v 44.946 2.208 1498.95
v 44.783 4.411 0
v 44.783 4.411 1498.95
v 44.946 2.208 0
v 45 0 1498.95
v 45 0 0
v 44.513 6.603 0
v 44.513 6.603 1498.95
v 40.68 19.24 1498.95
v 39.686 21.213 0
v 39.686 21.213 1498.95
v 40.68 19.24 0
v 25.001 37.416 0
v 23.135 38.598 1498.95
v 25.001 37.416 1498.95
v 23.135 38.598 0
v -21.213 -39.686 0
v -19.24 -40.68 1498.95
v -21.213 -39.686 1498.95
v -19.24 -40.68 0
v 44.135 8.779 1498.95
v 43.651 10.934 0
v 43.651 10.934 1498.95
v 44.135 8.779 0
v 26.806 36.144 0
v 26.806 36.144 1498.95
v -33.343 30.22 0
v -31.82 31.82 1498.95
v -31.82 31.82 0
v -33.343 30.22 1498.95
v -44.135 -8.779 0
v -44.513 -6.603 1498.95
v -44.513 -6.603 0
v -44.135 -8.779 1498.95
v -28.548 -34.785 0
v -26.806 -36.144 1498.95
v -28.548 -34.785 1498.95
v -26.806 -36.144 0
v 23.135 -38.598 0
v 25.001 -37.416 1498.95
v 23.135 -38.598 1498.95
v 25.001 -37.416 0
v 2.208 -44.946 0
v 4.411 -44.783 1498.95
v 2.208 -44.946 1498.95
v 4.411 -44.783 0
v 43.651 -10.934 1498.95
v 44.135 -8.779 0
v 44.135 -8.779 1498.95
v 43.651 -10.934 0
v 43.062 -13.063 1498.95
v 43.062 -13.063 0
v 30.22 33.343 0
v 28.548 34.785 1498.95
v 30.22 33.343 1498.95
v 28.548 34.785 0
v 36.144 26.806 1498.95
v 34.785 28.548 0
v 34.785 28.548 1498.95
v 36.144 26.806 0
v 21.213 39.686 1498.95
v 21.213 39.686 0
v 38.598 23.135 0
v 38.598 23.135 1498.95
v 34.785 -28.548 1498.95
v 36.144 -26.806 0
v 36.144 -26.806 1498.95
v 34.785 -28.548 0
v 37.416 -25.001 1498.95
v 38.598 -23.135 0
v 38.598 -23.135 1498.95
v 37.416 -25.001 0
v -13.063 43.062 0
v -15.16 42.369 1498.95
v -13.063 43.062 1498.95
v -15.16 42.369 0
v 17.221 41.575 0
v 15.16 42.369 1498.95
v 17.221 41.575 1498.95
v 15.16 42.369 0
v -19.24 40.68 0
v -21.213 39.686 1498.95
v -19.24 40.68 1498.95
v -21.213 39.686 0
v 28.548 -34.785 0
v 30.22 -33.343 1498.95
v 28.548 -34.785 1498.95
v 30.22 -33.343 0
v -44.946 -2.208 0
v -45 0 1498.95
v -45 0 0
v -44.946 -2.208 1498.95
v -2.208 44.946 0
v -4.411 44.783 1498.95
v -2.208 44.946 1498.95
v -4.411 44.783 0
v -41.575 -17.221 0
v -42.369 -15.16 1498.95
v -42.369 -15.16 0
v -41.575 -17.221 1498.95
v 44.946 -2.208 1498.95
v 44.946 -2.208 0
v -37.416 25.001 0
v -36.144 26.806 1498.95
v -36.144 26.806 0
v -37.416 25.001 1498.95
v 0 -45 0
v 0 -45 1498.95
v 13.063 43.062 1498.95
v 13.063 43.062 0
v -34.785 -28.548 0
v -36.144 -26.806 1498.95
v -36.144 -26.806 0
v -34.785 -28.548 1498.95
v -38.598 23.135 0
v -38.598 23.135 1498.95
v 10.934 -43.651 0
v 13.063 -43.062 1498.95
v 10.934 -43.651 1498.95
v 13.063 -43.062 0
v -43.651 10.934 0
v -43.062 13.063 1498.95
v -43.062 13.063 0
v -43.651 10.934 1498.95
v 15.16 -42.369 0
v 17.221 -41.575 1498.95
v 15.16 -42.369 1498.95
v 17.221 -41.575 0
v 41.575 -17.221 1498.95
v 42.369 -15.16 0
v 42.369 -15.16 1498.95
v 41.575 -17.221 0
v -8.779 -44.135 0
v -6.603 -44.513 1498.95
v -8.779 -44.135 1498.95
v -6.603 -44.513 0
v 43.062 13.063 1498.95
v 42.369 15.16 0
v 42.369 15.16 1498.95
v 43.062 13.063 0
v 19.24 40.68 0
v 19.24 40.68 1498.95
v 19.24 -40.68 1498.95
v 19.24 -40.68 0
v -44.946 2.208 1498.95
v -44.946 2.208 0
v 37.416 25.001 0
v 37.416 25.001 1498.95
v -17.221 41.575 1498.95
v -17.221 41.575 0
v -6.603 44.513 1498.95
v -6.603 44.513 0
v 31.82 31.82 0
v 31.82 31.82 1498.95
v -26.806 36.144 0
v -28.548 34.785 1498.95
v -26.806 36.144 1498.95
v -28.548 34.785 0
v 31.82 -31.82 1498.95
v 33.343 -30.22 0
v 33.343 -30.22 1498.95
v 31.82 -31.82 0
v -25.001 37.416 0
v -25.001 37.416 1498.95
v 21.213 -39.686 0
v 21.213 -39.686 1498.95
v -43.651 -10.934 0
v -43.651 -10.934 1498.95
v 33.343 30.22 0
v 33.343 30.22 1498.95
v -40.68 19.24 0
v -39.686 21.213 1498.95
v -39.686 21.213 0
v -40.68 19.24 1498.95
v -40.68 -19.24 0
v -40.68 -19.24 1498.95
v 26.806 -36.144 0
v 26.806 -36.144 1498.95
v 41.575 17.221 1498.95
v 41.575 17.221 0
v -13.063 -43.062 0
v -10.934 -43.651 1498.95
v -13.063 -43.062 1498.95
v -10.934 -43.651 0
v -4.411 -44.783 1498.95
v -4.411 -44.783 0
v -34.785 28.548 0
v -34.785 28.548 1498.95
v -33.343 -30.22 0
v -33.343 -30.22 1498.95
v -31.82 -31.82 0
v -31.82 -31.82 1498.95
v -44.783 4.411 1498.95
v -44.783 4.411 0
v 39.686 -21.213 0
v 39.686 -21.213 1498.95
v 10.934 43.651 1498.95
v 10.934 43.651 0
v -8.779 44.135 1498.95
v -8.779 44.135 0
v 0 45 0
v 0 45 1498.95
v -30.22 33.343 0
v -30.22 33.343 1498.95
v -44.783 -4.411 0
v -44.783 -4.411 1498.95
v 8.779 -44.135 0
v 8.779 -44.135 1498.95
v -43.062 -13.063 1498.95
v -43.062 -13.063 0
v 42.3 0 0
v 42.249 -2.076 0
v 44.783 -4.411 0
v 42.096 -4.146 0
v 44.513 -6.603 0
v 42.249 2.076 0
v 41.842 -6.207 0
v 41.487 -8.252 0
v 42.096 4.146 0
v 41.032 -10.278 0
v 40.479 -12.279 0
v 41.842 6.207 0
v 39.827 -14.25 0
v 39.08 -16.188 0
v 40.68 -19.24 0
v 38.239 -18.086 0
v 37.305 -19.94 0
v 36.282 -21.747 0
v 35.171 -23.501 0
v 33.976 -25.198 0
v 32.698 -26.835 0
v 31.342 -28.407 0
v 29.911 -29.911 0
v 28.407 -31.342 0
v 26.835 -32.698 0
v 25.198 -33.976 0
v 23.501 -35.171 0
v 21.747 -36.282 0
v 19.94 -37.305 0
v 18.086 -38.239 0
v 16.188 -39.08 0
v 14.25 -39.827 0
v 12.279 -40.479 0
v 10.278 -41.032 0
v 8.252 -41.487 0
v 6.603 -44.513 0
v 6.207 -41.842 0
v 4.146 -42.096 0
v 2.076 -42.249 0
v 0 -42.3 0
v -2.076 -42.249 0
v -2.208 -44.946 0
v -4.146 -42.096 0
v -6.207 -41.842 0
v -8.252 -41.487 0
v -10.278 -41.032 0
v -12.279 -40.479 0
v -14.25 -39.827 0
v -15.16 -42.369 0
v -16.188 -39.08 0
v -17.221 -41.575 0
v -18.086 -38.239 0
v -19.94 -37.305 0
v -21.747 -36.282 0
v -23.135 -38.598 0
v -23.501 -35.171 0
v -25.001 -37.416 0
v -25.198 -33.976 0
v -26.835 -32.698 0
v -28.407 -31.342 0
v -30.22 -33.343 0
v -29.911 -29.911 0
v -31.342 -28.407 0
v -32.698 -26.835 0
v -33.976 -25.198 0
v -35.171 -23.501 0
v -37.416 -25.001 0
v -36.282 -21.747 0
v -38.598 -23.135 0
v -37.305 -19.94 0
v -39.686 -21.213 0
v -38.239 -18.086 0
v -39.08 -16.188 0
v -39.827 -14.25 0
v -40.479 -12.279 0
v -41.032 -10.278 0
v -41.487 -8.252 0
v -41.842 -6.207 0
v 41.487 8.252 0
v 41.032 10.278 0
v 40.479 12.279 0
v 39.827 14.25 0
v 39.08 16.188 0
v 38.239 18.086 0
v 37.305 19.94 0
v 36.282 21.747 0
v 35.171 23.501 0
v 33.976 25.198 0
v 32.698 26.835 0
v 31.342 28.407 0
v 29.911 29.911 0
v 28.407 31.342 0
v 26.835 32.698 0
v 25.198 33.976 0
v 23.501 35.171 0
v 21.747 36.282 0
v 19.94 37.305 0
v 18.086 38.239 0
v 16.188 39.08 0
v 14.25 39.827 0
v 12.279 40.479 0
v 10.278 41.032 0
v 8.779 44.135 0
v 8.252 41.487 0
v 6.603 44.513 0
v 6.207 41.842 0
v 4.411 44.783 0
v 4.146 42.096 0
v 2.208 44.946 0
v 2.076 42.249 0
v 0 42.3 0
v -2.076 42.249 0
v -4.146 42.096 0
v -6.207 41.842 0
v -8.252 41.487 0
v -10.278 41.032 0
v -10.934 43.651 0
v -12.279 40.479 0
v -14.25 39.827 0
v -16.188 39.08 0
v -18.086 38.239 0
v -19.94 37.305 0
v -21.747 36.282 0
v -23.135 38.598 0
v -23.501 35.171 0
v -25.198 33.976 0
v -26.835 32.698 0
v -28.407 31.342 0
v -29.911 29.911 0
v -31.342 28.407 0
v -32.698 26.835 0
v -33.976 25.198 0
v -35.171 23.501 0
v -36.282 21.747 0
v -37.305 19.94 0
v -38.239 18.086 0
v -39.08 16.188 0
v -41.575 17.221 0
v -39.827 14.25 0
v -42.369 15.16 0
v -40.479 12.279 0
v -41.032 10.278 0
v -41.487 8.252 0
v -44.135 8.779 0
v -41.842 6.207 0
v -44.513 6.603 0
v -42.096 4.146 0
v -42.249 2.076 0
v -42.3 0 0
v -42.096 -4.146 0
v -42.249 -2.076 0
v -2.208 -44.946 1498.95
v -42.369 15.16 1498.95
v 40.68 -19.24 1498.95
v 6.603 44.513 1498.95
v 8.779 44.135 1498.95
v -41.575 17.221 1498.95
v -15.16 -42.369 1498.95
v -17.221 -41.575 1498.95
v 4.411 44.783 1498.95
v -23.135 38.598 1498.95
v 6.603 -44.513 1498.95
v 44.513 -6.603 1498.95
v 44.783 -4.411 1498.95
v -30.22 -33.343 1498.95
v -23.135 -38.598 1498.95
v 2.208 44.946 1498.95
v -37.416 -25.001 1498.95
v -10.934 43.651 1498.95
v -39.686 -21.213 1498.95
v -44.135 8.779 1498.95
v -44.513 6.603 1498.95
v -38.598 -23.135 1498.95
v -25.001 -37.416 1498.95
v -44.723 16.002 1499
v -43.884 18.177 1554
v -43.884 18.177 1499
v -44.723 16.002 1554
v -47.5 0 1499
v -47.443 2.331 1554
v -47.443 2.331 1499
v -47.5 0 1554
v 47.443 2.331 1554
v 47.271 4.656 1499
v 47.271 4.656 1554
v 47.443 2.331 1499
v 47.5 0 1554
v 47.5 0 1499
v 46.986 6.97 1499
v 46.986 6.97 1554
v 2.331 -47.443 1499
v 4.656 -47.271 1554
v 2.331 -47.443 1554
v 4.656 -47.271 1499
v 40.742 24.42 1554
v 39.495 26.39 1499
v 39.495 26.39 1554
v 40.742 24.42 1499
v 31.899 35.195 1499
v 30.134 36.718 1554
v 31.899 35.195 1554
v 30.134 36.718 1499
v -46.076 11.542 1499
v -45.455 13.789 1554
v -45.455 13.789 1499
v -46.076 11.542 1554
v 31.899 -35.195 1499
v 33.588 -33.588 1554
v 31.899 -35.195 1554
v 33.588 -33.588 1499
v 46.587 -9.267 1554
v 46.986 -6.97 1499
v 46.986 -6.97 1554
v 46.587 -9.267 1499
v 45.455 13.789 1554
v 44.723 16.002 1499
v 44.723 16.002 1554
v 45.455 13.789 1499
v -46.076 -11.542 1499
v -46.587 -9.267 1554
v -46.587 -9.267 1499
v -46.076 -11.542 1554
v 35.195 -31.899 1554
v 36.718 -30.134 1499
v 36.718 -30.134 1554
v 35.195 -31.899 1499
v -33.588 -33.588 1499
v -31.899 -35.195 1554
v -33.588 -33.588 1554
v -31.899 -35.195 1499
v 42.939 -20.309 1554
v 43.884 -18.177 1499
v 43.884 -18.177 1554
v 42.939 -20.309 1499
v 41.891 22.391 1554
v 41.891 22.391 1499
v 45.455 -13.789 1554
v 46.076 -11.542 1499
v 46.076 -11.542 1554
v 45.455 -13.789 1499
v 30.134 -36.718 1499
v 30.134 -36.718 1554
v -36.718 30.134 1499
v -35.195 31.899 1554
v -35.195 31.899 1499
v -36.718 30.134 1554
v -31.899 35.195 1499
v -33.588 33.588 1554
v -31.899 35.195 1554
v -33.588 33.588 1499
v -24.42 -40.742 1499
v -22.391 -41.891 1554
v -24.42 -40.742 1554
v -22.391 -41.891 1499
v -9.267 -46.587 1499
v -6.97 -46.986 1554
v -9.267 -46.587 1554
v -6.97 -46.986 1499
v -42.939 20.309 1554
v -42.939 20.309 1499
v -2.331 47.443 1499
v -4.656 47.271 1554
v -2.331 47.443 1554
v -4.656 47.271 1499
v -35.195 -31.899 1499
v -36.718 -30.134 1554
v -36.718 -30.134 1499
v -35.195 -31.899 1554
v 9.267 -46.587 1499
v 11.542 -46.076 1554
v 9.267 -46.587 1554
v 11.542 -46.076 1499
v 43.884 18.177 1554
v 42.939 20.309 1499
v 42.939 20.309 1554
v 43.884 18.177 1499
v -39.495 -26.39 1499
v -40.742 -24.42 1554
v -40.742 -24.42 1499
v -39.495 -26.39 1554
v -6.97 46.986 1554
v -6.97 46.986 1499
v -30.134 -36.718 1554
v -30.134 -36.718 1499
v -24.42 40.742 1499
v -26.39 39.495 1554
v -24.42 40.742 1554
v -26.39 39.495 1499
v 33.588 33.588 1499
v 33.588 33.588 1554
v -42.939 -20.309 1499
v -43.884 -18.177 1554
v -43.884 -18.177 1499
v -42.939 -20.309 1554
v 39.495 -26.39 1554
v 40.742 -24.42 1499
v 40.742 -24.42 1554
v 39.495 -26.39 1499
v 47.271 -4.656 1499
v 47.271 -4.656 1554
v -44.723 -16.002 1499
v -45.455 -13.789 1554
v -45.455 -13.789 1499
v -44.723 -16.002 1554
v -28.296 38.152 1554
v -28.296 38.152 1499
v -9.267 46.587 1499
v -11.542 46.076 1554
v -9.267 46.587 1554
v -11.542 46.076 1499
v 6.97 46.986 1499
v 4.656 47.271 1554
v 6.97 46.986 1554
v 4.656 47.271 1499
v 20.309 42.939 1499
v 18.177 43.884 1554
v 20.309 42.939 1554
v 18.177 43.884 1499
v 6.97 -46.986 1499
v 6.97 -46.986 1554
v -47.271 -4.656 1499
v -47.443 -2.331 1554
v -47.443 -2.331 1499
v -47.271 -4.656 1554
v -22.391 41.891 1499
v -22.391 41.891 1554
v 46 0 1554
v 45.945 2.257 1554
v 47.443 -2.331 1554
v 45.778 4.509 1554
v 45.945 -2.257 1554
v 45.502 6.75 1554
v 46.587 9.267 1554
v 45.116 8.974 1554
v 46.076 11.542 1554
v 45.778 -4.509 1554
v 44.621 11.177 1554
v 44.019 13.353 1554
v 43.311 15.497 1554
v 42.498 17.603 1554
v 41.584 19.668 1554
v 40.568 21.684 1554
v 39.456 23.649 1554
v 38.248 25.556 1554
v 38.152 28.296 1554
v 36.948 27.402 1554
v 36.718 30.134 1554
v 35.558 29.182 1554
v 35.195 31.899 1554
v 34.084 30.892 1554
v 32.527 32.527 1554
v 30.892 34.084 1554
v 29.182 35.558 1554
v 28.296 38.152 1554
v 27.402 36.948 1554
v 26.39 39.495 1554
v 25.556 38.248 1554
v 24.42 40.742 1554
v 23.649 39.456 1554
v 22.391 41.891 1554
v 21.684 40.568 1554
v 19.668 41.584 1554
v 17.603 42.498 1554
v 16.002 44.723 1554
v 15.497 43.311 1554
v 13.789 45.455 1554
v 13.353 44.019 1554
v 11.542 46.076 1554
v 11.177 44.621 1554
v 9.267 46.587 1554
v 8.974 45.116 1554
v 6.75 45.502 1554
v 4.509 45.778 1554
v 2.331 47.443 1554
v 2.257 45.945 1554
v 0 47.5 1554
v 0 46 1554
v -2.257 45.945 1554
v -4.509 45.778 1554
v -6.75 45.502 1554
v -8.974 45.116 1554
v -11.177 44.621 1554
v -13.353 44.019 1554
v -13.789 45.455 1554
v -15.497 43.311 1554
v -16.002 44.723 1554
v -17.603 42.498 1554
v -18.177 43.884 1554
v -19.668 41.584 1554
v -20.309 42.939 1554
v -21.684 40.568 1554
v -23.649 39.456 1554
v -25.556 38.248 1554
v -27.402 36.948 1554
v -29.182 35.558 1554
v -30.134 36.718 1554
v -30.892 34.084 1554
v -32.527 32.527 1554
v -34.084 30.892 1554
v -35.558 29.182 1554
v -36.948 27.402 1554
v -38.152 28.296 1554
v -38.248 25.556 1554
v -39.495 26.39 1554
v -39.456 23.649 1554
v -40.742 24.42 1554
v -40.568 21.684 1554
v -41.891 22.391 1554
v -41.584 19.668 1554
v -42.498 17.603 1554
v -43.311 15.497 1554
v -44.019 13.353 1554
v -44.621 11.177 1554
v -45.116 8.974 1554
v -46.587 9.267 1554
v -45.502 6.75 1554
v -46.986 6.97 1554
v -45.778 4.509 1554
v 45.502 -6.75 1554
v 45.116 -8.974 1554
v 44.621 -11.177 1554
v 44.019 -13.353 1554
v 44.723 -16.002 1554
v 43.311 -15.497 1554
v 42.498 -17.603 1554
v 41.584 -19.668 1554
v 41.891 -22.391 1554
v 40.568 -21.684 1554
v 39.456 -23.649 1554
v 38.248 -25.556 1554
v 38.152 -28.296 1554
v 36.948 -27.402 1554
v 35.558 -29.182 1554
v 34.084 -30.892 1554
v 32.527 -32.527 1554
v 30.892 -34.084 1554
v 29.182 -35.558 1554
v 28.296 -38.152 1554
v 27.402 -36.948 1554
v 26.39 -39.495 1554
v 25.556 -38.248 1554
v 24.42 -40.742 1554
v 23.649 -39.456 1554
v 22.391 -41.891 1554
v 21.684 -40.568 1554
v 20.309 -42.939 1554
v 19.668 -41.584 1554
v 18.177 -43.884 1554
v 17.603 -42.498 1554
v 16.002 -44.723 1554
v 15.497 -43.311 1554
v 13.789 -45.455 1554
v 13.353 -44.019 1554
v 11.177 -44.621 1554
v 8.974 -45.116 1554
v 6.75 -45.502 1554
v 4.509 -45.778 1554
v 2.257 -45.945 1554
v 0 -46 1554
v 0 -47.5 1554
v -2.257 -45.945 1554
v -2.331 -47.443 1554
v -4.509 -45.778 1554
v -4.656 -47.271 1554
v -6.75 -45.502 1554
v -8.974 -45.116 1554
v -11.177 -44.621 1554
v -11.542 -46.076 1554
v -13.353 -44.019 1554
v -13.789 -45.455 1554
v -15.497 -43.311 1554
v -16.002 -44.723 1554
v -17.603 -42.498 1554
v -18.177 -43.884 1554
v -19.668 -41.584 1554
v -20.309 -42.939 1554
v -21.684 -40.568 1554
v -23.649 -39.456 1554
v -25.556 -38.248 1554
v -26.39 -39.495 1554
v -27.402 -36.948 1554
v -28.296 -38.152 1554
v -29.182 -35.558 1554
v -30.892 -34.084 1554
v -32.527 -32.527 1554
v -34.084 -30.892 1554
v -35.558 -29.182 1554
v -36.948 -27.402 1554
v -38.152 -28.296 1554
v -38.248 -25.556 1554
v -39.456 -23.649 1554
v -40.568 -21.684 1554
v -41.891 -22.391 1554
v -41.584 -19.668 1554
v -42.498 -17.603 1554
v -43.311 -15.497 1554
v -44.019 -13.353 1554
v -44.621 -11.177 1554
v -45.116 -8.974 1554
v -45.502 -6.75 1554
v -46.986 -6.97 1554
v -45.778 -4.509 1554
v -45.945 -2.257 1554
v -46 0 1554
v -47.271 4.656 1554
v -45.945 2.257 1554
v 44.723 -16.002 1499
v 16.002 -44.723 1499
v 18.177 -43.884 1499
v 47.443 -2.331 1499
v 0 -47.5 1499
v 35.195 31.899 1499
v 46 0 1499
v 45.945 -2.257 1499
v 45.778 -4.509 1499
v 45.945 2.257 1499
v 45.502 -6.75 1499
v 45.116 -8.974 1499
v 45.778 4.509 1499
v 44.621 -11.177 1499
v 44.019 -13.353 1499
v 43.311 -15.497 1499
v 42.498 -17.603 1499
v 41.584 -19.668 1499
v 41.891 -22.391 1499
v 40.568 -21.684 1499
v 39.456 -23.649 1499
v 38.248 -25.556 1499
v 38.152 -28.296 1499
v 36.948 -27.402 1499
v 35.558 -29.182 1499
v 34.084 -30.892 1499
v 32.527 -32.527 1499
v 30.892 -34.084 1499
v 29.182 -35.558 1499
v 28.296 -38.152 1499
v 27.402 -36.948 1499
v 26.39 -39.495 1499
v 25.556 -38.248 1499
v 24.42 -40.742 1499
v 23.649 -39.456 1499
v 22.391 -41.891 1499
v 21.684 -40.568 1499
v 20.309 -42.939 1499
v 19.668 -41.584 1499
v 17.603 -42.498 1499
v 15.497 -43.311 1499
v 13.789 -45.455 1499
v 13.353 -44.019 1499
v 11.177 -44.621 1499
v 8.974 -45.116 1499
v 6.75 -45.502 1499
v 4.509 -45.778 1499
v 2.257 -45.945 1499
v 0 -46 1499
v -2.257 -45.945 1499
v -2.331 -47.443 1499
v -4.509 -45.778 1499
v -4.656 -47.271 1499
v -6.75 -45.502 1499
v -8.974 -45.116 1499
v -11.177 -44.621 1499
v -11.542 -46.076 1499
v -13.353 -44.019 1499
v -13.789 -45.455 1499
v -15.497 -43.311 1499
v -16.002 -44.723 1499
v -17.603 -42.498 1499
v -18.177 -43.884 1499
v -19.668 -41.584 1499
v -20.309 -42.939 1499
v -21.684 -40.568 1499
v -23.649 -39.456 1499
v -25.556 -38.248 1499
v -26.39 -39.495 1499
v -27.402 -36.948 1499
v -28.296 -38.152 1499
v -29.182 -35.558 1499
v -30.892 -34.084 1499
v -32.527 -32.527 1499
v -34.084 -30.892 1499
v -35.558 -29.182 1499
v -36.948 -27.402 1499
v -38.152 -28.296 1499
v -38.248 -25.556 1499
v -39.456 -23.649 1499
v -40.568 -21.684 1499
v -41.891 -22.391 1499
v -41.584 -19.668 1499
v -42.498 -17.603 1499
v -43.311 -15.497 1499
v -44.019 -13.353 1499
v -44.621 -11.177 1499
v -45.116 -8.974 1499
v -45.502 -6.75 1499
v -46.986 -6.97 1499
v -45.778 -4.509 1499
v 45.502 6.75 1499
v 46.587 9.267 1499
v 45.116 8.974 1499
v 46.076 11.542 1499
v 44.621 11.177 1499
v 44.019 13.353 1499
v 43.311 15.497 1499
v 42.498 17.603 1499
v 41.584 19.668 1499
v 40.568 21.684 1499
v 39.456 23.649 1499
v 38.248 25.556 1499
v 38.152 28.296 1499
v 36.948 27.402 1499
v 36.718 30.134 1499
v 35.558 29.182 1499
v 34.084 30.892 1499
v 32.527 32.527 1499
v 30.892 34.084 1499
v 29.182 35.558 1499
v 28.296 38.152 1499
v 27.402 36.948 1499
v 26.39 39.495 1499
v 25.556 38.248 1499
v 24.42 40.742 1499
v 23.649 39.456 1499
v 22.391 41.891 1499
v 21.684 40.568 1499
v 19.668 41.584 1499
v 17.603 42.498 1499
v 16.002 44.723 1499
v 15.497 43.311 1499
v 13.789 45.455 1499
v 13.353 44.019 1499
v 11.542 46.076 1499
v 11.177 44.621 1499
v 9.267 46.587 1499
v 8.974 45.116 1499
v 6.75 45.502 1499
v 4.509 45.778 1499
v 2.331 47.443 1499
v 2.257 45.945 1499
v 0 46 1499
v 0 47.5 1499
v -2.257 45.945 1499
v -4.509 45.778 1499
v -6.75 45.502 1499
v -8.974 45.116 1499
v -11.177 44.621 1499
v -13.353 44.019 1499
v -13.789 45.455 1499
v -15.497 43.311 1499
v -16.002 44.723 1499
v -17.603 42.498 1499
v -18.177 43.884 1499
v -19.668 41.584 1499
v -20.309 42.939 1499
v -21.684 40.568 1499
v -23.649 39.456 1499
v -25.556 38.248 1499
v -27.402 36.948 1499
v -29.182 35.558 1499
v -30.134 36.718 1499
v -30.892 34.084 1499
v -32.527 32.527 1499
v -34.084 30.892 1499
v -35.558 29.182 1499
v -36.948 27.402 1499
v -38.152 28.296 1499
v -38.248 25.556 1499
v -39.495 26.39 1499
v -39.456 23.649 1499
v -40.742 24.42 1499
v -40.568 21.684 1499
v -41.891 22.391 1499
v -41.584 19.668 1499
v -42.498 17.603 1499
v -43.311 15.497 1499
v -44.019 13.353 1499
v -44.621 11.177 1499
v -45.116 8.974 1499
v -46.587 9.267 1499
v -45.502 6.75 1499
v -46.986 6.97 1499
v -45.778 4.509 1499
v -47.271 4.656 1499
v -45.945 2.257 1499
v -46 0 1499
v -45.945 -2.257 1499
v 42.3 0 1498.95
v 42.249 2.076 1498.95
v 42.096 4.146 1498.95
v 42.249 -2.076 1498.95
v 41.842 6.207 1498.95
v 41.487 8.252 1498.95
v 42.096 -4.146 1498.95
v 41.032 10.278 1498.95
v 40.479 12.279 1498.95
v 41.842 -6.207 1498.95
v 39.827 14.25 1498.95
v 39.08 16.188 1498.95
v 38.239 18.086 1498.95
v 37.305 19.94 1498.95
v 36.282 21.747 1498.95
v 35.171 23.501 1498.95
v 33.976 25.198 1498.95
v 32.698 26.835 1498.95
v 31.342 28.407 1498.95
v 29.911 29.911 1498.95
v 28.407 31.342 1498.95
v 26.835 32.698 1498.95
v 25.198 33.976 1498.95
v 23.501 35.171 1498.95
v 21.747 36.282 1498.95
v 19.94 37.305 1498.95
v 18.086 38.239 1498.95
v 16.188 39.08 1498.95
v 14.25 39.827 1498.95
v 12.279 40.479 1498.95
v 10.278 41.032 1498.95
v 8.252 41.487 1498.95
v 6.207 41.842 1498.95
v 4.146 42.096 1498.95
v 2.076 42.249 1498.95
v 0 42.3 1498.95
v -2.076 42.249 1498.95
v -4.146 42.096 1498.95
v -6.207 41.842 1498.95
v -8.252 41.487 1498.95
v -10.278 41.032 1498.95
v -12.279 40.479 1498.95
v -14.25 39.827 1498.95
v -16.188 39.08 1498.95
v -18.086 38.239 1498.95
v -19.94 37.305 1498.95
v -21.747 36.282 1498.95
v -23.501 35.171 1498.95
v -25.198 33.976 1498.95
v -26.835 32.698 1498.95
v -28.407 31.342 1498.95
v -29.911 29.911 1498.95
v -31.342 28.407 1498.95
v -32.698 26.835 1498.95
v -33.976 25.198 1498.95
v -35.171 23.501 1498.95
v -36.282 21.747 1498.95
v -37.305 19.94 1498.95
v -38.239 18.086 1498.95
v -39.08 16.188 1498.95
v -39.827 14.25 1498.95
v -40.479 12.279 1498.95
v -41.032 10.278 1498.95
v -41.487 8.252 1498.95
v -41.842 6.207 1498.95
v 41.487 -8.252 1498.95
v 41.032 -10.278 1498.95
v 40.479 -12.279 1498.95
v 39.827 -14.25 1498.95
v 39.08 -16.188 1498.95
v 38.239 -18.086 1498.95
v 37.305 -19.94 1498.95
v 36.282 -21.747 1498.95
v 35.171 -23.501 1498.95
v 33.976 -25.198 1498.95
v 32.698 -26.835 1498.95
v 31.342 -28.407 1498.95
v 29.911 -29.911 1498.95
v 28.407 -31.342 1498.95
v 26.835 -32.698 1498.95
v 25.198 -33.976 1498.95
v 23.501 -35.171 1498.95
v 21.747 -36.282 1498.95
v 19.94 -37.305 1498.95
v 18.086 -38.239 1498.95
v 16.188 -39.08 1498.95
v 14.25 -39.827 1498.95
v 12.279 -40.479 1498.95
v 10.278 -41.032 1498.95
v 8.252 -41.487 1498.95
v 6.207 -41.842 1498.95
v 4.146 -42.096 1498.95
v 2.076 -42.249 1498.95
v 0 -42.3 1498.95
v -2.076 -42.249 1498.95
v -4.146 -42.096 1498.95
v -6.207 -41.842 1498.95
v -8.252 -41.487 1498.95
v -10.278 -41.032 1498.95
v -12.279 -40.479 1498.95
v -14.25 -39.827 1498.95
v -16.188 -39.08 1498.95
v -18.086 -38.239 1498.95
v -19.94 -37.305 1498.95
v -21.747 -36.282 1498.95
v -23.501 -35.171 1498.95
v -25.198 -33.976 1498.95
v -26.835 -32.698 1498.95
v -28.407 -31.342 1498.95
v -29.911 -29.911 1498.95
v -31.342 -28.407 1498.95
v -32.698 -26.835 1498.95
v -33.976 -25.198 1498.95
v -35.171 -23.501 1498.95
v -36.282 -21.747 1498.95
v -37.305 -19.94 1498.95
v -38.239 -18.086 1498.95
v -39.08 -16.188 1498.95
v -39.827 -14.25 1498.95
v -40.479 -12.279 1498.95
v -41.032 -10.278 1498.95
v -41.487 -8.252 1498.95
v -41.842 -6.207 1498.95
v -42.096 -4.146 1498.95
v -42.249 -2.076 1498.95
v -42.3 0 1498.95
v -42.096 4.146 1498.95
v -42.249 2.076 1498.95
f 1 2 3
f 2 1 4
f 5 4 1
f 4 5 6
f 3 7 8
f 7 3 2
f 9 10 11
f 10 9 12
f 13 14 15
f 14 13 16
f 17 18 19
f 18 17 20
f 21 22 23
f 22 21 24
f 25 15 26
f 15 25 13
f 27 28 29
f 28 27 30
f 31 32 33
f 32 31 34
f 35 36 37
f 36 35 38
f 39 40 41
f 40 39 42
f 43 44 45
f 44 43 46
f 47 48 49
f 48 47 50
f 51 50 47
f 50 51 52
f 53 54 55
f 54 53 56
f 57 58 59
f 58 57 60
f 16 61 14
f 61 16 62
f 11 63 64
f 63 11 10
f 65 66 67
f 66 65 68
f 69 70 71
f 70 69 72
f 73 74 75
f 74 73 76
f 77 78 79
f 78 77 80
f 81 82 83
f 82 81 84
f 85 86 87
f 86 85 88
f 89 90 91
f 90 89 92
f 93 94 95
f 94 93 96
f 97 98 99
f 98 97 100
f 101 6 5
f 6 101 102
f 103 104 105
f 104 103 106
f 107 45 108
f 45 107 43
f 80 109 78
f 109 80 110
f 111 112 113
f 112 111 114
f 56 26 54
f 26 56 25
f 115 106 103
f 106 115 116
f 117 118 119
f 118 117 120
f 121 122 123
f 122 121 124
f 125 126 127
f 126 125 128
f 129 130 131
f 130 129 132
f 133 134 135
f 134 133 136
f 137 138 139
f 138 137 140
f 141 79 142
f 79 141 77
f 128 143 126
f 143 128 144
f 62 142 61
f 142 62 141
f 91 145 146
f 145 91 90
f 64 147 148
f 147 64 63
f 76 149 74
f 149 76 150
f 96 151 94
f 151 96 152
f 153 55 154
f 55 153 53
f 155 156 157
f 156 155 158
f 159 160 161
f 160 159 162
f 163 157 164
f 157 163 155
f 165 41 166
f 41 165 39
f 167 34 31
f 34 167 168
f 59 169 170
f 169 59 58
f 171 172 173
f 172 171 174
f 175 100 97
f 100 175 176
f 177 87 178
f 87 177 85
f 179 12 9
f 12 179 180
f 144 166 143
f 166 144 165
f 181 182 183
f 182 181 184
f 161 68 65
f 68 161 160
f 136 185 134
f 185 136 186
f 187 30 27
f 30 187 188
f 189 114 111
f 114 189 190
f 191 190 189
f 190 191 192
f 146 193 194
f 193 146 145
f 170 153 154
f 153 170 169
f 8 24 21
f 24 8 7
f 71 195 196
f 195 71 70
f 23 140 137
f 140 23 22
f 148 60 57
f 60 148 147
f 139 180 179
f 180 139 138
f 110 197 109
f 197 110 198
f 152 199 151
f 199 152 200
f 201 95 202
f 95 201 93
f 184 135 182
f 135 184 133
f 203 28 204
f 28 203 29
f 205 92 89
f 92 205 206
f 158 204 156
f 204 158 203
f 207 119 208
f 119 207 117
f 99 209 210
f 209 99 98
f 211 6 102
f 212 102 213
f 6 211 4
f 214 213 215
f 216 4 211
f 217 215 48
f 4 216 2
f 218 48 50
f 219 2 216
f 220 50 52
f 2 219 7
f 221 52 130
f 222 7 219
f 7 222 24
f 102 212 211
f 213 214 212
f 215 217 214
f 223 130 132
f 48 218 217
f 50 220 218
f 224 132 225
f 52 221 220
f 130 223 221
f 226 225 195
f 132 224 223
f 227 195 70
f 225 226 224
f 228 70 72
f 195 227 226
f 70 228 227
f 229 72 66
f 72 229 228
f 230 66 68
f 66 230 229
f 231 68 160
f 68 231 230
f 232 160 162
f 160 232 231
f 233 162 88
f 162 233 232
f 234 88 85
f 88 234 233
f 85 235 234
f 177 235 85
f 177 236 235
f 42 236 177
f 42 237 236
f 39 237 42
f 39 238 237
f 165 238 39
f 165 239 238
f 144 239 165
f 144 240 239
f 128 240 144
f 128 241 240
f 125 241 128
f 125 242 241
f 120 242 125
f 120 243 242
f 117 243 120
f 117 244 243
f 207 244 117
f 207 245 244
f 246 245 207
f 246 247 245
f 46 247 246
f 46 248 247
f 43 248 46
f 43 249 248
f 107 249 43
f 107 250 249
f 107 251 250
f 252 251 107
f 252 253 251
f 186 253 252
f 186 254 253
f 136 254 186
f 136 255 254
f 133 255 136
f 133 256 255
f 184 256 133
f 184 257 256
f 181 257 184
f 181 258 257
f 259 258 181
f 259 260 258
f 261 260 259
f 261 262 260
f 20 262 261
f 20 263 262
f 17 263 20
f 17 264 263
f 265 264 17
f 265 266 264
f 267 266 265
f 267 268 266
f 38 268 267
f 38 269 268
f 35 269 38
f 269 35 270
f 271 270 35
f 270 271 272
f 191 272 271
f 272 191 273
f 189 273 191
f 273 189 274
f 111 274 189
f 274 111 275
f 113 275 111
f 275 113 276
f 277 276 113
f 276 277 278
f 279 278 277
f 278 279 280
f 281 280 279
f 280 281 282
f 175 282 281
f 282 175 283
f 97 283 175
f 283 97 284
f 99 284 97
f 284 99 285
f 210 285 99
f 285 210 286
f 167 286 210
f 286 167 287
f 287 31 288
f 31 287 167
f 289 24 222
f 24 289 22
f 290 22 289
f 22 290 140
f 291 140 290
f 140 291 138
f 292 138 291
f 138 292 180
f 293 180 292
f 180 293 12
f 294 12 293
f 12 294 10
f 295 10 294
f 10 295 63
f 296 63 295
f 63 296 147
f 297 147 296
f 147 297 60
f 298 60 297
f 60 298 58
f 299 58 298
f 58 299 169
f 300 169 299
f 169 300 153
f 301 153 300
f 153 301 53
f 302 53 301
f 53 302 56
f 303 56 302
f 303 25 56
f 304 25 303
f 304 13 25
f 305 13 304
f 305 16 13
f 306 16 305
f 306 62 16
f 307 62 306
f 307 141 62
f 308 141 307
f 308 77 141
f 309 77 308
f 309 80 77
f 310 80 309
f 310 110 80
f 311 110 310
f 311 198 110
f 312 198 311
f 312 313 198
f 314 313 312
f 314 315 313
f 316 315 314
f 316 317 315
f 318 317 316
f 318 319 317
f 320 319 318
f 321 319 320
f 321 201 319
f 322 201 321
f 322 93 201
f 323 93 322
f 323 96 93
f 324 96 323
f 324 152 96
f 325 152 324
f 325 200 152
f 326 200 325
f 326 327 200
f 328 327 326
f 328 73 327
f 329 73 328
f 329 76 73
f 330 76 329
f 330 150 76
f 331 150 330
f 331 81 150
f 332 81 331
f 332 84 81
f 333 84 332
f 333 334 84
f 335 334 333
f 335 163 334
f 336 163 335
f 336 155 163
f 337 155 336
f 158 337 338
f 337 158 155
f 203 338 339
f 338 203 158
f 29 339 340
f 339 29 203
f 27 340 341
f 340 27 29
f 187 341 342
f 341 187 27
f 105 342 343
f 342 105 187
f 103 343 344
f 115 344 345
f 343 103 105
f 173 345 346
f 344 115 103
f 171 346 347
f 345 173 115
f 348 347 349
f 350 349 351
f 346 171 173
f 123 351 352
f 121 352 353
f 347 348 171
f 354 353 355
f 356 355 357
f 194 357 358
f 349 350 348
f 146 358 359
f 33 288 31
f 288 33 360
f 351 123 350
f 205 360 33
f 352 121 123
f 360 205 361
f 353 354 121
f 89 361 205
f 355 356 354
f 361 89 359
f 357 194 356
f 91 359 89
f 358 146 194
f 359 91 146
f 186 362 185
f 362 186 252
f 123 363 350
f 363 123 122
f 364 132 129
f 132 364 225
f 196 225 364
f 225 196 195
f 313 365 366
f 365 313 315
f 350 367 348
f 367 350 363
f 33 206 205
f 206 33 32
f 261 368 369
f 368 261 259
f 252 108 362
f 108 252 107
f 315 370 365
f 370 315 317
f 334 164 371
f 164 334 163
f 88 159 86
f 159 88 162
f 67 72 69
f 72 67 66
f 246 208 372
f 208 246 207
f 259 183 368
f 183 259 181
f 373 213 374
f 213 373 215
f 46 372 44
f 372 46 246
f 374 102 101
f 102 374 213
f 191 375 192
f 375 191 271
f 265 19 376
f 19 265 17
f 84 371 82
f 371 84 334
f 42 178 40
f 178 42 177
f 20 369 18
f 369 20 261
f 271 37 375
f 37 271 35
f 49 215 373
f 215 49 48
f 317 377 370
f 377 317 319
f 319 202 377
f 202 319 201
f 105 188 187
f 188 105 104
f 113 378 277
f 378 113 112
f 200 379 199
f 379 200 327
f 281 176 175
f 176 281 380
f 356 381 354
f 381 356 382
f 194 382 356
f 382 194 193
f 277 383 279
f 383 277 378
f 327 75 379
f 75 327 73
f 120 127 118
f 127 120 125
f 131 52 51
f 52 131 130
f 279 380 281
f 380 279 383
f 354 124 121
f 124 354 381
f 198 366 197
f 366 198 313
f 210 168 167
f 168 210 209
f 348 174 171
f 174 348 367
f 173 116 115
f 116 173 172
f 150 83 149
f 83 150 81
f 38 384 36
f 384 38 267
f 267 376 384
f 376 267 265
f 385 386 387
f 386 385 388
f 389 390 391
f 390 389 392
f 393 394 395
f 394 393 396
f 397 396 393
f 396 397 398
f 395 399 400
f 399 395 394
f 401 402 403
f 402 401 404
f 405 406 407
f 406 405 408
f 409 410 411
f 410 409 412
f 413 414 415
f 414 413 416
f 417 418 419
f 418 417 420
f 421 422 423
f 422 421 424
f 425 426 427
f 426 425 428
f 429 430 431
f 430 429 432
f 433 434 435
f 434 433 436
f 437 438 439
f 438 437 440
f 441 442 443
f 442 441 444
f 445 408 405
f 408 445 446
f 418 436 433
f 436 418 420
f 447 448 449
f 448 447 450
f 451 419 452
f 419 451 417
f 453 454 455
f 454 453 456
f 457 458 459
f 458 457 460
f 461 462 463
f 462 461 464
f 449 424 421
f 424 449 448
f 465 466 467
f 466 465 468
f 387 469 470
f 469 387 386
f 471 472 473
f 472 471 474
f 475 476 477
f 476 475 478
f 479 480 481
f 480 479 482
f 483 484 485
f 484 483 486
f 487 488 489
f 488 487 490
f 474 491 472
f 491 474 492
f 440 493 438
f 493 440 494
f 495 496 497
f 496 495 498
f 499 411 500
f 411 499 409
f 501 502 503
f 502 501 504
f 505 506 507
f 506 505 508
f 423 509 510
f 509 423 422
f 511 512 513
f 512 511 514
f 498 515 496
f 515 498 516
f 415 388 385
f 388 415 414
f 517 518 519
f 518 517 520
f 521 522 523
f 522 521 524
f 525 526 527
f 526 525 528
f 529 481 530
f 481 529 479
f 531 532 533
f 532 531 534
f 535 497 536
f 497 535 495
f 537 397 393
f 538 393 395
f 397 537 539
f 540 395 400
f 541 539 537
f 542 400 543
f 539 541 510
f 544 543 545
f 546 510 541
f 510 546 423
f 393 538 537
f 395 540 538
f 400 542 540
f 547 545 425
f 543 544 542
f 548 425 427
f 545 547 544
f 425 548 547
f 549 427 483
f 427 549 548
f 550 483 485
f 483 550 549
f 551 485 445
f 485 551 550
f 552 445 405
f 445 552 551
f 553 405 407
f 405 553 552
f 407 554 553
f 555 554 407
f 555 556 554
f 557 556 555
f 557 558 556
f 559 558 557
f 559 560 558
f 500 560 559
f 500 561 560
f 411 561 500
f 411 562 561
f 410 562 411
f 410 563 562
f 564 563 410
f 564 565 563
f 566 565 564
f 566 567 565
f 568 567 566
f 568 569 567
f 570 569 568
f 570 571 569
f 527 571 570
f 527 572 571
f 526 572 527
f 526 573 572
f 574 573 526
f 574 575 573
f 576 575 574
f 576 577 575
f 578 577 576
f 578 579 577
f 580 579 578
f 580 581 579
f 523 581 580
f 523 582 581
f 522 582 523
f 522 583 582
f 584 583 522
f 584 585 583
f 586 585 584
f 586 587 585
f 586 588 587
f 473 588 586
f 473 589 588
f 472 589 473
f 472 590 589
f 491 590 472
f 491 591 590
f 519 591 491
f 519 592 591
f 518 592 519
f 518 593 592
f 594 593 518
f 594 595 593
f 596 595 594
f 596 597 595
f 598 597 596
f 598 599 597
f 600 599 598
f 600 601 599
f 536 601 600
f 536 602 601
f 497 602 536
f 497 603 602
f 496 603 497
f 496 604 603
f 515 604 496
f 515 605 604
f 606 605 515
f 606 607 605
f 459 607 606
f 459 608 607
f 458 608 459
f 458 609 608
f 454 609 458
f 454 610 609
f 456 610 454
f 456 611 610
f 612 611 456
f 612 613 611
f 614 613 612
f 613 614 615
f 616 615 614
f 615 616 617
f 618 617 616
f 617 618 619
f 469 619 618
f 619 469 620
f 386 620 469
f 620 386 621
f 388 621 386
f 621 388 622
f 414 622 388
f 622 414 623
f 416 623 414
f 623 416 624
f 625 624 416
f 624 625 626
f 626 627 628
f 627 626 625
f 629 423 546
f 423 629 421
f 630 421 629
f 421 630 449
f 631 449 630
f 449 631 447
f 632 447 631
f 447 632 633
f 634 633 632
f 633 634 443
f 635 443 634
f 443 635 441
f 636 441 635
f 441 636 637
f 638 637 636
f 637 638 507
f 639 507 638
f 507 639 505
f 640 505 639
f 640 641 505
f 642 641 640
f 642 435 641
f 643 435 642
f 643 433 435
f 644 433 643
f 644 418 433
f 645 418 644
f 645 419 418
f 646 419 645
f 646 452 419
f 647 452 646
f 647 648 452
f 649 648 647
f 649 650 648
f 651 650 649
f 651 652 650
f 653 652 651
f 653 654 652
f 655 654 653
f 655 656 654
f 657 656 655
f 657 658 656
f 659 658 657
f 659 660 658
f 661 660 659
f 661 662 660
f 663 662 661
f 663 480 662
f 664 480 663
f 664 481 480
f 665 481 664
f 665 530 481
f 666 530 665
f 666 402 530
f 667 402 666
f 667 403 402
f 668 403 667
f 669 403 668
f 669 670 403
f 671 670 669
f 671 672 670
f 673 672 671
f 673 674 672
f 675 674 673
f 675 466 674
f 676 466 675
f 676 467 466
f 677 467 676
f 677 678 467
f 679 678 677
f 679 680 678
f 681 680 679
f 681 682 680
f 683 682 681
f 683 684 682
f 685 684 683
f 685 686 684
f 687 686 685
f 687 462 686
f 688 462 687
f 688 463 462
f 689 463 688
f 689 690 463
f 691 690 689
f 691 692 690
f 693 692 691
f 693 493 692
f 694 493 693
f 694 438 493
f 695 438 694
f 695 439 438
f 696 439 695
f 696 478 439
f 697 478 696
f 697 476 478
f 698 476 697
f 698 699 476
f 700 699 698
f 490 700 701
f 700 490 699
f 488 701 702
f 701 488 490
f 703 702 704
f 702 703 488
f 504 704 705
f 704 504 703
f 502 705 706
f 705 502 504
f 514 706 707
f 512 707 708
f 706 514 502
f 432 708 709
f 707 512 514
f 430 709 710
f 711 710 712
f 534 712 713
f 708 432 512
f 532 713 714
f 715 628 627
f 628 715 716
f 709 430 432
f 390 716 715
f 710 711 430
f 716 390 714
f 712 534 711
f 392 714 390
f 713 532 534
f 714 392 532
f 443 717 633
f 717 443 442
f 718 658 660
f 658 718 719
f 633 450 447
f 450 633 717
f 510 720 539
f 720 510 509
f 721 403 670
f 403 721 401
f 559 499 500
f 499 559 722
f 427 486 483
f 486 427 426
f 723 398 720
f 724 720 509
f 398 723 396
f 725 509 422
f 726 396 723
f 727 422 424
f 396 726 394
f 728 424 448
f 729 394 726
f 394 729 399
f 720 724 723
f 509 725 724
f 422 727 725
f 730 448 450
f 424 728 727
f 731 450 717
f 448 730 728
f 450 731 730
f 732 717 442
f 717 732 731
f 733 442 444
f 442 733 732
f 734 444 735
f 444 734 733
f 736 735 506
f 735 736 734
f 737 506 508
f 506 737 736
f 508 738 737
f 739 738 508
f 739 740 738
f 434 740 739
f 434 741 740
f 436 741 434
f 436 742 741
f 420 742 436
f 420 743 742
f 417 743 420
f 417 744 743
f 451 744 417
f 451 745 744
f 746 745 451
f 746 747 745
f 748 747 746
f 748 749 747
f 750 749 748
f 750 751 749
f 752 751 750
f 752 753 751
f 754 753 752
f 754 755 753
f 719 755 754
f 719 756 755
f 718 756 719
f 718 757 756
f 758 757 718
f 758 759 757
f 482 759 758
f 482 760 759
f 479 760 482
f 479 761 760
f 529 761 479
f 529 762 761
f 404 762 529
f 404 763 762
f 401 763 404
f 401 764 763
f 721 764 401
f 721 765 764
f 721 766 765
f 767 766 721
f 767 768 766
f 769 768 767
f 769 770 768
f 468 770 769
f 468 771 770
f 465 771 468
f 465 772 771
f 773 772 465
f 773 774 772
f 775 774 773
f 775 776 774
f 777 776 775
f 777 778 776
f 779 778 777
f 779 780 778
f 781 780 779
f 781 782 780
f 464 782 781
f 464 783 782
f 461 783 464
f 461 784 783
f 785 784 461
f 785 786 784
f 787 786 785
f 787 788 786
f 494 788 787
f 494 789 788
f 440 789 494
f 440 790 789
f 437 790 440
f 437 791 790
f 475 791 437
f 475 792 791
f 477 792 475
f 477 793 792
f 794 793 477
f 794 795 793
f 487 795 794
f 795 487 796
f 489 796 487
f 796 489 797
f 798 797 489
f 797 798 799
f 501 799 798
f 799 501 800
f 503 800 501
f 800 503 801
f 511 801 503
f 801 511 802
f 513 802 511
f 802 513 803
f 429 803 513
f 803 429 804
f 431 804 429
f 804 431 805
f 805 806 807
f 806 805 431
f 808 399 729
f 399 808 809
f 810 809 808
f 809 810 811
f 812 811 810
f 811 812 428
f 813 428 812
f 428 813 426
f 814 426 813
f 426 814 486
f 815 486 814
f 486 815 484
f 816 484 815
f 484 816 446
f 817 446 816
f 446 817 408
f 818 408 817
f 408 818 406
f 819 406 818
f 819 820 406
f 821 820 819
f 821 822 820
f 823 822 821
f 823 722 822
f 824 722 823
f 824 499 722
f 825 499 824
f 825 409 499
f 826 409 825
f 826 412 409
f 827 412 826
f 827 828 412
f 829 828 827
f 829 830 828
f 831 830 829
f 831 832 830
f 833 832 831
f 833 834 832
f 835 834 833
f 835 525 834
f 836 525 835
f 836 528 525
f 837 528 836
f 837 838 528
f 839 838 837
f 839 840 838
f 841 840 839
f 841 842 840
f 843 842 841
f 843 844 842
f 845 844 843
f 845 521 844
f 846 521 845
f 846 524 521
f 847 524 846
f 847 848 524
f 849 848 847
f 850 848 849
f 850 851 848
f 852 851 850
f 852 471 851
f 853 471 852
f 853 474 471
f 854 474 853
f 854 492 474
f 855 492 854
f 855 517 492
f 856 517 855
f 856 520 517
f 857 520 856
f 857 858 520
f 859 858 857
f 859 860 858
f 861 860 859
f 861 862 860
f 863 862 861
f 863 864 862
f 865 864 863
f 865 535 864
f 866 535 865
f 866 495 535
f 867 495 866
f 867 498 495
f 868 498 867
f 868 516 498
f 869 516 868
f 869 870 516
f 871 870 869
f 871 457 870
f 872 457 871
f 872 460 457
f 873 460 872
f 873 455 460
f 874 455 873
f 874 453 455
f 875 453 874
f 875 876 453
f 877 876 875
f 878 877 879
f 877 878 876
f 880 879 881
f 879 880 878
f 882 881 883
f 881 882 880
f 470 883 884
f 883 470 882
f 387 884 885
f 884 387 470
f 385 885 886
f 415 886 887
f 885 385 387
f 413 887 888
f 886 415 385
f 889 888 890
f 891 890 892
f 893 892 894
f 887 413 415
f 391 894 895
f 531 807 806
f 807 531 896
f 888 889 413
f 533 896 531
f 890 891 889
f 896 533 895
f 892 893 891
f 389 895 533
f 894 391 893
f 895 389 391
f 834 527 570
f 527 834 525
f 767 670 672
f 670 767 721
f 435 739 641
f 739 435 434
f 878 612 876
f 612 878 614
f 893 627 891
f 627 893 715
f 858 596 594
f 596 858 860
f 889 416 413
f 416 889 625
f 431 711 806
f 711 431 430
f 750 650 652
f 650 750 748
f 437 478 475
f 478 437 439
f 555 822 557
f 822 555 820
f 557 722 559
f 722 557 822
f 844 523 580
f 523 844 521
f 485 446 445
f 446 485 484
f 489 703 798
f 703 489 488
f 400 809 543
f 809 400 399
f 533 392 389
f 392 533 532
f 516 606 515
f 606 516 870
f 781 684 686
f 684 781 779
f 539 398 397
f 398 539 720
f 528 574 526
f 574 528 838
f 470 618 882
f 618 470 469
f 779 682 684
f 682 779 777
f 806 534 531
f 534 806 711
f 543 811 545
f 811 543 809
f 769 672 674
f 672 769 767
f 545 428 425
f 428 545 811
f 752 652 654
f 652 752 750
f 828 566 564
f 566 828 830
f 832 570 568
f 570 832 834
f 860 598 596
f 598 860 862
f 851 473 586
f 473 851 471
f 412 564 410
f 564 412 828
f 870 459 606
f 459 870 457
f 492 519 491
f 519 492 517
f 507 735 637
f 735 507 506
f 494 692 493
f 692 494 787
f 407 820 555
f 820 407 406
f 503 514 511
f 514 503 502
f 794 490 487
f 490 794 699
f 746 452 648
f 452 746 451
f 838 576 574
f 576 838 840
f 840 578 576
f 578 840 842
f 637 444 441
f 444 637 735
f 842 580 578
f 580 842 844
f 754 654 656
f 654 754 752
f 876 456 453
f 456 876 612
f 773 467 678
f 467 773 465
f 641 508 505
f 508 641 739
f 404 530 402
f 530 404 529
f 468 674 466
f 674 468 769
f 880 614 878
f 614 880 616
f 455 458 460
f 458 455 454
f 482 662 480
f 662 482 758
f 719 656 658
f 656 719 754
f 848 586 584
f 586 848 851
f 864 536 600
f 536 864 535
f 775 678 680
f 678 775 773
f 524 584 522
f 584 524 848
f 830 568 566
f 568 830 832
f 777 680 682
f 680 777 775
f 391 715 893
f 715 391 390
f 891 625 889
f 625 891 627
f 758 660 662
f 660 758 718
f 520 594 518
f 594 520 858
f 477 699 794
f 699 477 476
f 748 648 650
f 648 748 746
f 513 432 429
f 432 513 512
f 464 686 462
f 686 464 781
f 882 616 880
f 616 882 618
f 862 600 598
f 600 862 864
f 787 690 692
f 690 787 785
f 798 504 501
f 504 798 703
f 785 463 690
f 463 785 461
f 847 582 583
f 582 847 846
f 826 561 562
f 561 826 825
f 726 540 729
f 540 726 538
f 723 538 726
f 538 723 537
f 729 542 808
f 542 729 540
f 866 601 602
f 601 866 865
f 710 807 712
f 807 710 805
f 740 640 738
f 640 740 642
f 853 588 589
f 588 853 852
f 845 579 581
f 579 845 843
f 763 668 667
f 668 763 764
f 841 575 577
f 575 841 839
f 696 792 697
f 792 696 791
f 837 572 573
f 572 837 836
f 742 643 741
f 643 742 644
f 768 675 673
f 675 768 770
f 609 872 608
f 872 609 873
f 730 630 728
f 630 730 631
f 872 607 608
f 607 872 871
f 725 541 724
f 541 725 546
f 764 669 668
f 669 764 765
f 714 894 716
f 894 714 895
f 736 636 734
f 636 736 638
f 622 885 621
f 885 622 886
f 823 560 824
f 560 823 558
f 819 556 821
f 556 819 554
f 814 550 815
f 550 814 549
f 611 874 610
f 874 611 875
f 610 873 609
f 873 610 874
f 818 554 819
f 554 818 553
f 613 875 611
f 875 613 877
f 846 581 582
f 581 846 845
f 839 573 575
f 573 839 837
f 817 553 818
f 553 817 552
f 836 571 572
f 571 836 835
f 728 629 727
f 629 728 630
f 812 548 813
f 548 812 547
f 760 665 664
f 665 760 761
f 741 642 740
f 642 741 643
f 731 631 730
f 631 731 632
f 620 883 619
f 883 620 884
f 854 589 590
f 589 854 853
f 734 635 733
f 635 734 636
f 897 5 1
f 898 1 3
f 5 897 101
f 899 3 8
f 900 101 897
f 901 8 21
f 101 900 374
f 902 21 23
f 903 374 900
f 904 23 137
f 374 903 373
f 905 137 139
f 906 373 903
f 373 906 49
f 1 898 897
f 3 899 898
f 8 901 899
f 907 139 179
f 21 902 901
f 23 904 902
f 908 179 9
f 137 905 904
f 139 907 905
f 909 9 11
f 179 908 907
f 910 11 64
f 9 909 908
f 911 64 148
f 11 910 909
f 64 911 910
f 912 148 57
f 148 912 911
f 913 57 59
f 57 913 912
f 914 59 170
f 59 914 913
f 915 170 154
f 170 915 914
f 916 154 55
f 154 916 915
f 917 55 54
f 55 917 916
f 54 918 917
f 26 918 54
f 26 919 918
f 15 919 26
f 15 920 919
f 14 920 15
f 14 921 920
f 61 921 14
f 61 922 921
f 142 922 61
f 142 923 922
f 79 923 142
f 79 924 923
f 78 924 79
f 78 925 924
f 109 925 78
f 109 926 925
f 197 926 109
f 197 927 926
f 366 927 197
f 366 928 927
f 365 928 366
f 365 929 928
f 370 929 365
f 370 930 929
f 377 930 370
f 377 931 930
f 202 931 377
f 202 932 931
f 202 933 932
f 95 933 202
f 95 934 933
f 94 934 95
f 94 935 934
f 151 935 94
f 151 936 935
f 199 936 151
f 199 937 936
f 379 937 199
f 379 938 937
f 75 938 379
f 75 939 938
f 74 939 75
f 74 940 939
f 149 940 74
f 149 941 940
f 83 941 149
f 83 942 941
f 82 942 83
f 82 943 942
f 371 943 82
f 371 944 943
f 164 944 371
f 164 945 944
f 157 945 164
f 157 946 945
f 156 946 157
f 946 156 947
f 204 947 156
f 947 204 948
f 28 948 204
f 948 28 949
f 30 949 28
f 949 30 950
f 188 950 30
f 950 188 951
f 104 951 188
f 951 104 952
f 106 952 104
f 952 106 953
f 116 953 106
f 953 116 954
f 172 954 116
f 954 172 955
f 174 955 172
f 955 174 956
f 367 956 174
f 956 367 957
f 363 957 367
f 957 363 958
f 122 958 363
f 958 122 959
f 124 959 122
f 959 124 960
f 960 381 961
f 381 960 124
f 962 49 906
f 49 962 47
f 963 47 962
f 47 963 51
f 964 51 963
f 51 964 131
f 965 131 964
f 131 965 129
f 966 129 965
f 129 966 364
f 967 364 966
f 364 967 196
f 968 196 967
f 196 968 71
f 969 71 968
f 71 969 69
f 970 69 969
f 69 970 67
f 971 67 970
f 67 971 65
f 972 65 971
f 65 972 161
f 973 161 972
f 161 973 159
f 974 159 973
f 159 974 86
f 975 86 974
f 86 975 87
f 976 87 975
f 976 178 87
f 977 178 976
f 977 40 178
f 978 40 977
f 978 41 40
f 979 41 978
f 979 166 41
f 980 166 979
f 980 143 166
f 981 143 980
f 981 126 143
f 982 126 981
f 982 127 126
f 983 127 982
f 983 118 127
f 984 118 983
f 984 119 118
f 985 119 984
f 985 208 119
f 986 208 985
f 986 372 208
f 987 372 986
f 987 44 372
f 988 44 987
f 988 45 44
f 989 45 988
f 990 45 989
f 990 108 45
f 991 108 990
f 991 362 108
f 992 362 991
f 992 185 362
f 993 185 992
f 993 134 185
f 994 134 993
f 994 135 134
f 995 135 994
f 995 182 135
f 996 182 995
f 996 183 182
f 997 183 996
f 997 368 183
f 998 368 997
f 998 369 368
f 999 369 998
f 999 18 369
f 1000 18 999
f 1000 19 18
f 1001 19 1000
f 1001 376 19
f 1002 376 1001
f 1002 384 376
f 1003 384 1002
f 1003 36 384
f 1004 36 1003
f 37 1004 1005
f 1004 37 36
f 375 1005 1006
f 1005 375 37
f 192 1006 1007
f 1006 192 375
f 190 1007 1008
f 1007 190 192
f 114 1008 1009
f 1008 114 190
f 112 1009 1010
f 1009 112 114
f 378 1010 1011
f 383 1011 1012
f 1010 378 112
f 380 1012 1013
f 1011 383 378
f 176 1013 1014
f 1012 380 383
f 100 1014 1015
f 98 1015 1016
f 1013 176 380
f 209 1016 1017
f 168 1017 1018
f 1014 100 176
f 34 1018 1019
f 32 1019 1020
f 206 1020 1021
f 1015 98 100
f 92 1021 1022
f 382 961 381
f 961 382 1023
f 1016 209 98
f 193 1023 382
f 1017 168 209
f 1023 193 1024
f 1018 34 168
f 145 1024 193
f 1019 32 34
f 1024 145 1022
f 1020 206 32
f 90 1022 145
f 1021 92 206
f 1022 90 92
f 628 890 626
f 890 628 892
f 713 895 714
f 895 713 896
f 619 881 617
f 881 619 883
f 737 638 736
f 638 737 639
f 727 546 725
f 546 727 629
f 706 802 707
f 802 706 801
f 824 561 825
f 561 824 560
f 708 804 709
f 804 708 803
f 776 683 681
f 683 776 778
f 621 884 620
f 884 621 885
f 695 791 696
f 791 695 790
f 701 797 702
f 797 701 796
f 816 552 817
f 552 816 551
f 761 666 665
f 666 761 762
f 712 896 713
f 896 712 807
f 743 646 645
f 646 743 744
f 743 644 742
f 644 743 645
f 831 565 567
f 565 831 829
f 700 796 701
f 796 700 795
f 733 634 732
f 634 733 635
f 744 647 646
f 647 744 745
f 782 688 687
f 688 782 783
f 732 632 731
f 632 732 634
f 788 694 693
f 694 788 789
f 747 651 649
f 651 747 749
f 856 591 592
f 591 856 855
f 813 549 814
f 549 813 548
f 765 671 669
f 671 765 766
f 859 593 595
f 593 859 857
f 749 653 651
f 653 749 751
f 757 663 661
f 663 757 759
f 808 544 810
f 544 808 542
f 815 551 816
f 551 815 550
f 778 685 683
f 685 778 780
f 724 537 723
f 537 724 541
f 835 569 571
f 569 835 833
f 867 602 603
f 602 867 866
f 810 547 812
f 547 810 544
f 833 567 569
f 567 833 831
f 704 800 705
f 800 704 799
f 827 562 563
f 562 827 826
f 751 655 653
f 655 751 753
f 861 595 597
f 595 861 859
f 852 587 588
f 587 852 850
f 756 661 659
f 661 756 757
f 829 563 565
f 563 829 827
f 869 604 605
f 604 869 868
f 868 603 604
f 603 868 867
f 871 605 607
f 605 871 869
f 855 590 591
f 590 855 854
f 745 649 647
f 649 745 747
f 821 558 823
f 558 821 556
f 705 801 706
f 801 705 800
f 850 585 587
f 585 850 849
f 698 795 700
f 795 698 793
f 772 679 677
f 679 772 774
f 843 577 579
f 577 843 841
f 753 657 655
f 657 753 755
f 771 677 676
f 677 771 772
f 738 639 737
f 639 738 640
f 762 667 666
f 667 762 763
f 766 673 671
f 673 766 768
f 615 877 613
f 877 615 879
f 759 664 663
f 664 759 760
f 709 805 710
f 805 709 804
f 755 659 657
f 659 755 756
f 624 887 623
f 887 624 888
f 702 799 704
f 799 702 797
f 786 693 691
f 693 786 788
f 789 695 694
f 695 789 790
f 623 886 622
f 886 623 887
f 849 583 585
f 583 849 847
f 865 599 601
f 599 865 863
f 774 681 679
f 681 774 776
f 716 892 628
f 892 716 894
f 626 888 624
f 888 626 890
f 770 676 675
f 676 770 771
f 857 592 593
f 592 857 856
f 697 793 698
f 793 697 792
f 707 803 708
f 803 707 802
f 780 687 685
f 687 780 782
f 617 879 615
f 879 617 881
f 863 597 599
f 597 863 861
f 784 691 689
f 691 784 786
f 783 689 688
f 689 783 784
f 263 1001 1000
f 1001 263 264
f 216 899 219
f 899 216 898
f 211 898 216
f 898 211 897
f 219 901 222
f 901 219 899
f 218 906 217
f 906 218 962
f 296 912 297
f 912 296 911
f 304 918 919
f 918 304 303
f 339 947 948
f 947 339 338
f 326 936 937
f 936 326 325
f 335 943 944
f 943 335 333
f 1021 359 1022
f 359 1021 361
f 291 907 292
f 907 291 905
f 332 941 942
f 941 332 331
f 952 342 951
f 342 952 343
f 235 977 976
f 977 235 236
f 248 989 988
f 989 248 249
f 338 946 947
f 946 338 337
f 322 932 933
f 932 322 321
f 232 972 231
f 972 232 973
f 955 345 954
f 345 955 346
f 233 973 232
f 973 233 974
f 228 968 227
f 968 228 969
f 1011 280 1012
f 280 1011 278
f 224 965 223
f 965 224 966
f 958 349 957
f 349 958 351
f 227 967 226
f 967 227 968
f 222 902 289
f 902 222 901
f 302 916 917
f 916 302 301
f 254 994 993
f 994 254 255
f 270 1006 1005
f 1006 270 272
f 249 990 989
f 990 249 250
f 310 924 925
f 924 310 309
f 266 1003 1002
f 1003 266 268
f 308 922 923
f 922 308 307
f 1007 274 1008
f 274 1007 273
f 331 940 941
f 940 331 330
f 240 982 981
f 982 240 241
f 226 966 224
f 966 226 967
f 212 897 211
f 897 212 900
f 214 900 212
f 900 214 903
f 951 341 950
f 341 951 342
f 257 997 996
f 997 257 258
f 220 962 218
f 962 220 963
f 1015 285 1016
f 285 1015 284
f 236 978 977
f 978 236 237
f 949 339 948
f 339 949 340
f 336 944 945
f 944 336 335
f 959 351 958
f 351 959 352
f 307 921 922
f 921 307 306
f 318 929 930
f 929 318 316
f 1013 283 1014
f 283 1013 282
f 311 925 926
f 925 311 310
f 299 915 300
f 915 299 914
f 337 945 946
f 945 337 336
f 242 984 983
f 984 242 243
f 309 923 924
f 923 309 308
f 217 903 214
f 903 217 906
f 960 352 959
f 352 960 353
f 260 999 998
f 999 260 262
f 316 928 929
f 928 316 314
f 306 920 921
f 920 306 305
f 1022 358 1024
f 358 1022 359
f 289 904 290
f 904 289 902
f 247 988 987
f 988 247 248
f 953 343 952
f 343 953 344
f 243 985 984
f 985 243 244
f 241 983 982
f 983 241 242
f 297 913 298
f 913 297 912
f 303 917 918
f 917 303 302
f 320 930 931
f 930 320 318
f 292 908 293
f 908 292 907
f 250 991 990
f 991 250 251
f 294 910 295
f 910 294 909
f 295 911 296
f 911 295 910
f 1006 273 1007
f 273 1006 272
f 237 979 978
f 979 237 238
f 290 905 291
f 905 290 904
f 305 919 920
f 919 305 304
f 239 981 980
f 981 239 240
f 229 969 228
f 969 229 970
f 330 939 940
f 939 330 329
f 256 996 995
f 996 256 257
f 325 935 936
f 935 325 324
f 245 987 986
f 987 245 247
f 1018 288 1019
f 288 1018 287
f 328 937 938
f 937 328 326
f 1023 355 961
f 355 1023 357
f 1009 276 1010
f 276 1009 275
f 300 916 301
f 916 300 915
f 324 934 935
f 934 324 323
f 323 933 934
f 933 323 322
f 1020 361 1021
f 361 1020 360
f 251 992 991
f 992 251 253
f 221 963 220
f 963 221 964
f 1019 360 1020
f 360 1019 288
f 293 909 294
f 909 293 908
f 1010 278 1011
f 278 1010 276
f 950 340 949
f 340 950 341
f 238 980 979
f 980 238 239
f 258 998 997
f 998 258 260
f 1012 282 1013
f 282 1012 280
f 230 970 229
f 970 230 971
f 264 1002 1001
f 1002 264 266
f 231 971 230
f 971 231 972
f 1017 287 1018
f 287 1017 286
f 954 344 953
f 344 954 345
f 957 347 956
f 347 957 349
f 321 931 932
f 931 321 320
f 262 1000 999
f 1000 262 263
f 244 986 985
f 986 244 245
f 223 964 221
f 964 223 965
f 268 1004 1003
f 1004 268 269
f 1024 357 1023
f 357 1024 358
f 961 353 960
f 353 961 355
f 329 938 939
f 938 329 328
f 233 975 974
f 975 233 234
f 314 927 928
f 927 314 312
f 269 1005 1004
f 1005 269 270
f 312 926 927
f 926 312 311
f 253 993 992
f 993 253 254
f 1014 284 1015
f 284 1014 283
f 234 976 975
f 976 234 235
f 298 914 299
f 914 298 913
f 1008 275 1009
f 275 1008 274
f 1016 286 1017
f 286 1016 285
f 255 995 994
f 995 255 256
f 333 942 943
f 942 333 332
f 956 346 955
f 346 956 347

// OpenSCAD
// Parameters
nominal_diameter_mm = 90; //[50:180:1]
length_mm = 1500; //[750:3000:10]
include_end_fitting = 1; //[0:1:1]
center = 0; //[0:1:1]

pipe_od_mm = 90; //[50:180:1]
pipe_wall_mm = 2.7; //[1.5:5.4:0.1]

socket_length_mm = 55; //[30:110:1]
socket_wall_extra_mm = 2.5; //[1:6:0.1]
socket_bore_clearance_mm = 1.0; //[0.2:2.5:0.1]
socket_stop_thickness_mm = 4; //[2:10:0.5]
socket_stop_length_mm = 10; //[5:25:1]

overlap_mm = 1; //[0.5:2:0.1]

$fn = 128;

module ht_pipe() {
  pipe_r_o = pipe_od_mm/2;
  pipe_r_i = max(0.01, pipe_r_o - pipe_wall_mm);

  socket_r_o = pipe_r_o + socket_wall_extra_mm;
  socket_r_i = pipe_r_o + socket_bore_clearance_mm;

  // Stop ring reduces bore near socket end
  stop_r_i = max(0.01, socket_r_i - socket_stop_thickness_mm);

  // Z placement
  z0 = center ? -length_mm/2 : 0;
  z_pipe0 = z0;
  z_pipe1 = z0 + length_mm;

  // Socket overlaps into pipe so it is connected
  z_sock0 = z_pipe1 - overlap_mm;
  z_sock1 = z_sock0 + socket_length_mm;

  z_stop0 = z_sock1 - socket_stop_length_mm;

  // Small epsilon to avoid coplanar/zero-thickness artifacts
  eps = 0.05;

  color([0.85, 0.85, 0.8])
  difference() {
    // OUTER SOLID (one connected solid)
    union() {
      translate([0, 0, z_pipe0])
        cylinder(h=length_mm, r=pipe_r_o, center=false);

      if (include_end_fitting) {
        translate([0, 0, z_sock0])
          cylinder(h=socket_length_mm, r=socket_r_o, center=false);
      }
    }

    // INNER VOID (continuous bore)
    union() {
      // Main pipe bore (extend slightly to ensure clean subtraction)
      translate([0, 0, z_pipe0 - eps])
        cylinder(h=length_mm + 2*eps, r=pipe_r_i, center=false);

      if (include_end_fitting) {
        // Socket bore (slightly larger than pipe bore)
        translate([0, 0, z_sock0 - eps])
          cylinder(h=socket_length_mm + 2*eps, r=socket_r_i, center=false);

        // Stop ring restriction (smaller bore near socket end)
        translate([0, 0, z_stop0 - eps])
          cylinder(h=socket_stop_length_mm + 2*eps, r=stop_r_i, center=false);
      }
    }
  }
}

ht_pipe();
